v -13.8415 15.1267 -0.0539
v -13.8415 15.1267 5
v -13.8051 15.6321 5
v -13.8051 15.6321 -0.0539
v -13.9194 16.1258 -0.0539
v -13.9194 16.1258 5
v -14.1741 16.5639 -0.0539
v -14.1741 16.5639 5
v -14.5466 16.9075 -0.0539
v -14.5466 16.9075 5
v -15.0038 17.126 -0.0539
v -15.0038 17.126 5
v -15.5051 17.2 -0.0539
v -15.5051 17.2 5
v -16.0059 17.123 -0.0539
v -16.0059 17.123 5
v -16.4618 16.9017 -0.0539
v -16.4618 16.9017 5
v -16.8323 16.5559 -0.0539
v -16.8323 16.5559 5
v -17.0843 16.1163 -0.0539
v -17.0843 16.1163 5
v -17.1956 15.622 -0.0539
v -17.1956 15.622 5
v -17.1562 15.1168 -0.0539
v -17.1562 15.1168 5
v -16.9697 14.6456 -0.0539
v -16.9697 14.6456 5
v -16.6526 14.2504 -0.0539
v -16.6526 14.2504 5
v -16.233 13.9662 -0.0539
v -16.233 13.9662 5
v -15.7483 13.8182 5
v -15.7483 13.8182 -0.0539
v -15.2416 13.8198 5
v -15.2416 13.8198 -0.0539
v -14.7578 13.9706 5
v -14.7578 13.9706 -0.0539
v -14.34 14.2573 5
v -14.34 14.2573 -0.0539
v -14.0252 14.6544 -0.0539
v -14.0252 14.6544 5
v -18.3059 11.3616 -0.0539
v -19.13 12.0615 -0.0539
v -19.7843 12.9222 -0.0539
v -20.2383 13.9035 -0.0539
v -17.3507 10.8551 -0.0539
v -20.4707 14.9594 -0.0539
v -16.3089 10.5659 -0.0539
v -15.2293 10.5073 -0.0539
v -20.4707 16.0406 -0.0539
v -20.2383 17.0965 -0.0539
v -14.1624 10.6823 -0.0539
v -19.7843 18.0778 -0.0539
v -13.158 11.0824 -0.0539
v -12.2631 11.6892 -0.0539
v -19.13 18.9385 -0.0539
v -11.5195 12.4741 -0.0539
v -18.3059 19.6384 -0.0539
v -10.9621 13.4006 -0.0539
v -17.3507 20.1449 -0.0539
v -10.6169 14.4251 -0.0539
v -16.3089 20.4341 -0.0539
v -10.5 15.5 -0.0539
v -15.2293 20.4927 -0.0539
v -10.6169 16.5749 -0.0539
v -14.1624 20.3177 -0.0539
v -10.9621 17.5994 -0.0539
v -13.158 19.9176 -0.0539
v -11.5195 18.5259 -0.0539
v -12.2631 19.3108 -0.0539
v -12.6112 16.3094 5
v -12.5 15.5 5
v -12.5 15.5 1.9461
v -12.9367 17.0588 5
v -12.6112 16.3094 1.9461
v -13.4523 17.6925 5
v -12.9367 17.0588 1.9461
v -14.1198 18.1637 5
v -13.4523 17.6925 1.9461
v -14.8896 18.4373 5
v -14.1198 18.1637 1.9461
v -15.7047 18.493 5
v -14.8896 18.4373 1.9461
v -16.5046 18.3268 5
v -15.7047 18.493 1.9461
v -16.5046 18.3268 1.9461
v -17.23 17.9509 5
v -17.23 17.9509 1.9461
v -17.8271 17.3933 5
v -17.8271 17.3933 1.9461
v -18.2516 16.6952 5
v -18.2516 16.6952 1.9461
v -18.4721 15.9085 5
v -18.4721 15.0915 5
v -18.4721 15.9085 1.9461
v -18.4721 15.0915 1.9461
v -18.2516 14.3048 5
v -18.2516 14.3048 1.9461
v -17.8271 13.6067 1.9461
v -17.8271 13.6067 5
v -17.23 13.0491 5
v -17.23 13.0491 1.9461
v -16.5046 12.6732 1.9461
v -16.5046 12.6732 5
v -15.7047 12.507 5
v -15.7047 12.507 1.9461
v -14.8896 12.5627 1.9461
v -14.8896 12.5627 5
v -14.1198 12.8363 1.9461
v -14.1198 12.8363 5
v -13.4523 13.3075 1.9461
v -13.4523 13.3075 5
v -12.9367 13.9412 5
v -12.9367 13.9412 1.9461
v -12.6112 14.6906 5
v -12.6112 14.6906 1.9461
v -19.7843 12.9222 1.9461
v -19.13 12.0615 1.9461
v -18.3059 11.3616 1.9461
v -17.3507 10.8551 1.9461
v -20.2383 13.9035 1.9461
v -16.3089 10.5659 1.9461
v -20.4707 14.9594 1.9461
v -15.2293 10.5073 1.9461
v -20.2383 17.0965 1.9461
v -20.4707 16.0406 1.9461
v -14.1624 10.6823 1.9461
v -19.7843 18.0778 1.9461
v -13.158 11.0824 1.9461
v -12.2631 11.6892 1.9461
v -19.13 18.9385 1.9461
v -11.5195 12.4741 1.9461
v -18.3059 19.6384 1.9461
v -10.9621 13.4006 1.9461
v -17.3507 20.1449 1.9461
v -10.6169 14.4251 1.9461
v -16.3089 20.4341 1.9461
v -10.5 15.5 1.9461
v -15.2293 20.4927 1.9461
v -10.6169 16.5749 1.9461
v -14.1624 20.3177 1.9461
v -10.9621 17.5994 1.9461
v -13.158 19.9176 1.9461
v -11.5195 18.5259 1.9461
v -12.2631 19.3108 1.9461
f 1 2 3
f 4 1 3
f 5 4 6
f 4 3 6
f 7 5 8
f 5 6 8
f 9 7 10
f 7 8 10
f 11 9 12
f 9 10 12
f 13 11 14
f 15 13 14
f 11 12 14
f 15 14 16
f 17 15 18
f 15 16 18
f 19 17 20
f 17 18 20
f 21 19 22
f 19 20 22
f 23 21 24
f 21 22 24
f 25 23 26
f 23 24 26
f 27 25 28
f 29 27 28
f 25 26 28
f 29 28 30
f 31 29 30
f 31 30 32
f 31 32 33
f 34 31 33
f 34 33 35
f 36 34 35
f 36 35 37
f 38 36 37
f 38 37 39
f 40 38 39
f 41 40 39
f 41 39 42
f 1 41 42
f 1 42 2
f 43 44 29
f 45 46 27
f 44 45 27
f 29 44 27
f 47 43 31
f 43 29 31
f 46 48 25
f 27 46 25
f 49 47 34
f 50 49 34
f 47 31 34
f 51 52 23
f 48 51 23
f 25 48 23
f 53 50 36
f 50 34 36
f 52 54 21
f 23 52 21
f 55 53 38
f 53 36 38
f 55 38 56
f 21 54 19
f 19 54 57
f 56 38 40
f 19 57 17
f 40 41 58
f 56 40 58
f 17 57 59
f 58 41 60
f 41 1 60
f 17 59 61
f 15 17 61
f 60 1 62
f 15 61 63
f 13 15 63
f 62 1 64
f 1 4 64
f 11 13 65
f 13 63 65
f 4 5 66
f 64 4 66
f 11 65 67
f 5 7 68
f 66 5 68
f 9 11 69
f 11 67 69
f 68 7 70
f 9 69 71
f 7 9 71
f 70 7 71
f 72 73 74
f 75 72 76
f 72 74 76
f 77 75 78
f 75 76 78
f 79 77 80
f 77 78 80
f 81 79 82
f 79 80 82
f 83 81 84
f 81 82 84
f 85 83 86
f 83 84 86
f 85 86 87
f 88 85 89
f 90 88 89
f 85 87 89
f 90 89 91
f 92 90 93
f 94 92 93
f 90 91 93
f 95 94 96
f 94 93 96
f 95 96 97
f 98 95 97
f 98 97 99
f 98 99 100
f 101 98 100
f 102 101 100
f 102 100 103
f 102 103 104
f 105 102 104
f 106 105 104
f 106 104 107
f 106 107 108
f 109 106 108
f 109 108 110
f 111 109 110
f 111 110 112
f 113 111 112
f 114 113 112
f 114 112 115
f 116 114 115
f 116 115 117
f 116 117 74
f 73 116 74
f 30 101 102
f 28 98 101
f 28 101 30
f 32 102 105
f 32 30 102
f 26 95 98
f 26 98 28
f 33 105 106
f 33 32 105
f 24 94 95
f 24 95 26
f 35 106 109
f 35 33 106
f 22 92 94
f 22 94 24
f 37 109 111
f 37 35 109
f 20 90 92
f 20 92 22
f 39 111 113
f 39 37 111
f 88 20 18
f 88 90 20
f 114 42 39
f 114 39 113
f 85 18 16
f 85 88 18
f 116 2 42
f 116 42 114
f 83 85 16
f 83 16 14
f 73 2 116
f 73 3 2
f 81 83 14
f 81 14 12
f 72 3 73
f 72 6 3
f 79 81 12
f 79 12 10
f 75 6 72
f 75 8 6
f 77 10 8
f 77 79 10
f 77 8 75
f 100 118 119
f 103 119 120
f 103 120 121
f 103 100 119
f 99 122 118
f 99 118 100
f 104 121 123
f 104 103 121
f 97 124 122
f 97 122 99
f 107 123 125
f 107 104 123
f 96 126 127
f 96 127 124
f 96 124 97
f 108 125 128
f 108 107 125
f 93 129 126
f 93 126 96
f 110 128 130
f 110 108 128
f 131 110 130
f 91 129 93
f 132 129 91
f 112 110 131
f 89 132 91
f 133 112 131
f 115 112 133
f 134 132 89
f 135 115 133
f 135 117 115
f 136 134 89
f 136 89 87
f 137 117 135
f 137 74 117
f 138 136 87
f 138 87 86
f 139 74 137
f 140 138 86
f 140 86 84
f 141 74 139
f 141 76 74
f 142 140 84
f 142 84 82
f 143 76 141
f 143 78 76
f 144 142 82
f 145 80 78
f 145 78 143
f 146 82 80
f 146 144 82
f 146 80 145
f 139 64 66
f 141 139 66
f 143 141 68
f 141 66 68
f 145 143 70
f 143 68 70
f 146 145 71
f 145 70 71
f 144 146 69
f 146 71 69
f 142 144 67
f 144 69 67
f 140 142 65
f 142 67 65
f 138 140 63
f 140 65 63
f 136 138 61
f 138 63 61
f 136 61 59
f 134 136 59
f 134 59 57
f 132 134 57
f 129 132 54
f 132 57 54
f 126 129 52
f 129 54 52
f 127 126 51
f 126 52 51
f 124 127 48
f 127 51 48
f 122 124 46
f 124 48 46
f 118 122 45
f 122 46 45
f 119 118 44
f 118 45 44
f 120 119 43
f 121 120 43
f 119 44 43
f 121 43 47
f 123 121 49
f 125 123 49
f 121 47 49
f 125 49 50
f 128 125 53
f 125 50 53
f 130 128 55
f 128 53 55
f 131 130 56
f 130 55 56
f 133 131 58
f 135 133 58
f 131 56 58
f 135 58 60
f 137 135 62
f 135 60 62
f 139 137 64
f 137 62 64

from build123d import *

# Parameters (mm, degrees)
SKETCH_1_R        = 3
EXTRUDE_2_DEPTH   = 5
SKETCH_3_R        = 5
EXTRUDE_3_DEPTH   = 2
HOLE_WIZARD_M31_D = 3.4


with BuildPart() as part:
    # Эскиз1 → Бобышка-Вытянуть2 (new body)
    with BuildSketch(Plane.XY):
        with Locations((-15.5, 15.5)):
            Circle(SKETCH_1_R)
    extrude(amount=EXTRUDE_2_DEPTH)

    # Эскиз3 → Бобышка-Вытянуть3 (add)
    with BuildSketch(Plane.XY.offset(-0.053912026)):
        with Locations((-15.5, 15.5)):
            Circle(SKETCH_3_R)
    extrude(amount=EXTRUDE_3_DEPTH)

    # Отверстие с зазором M31 (through all)
    with Locations(Plane(origin=(-3.782161831, -3.025449216, -0.053912026), x_dir=(-0.9755899156330161, 0.2196003563639286, 0), z_dir=(0, 0, -1))):
        with Locations((15.5, 15.5)):
            Hole(HOLE_WIZARD_M31_D / 2)


solid = part.part
